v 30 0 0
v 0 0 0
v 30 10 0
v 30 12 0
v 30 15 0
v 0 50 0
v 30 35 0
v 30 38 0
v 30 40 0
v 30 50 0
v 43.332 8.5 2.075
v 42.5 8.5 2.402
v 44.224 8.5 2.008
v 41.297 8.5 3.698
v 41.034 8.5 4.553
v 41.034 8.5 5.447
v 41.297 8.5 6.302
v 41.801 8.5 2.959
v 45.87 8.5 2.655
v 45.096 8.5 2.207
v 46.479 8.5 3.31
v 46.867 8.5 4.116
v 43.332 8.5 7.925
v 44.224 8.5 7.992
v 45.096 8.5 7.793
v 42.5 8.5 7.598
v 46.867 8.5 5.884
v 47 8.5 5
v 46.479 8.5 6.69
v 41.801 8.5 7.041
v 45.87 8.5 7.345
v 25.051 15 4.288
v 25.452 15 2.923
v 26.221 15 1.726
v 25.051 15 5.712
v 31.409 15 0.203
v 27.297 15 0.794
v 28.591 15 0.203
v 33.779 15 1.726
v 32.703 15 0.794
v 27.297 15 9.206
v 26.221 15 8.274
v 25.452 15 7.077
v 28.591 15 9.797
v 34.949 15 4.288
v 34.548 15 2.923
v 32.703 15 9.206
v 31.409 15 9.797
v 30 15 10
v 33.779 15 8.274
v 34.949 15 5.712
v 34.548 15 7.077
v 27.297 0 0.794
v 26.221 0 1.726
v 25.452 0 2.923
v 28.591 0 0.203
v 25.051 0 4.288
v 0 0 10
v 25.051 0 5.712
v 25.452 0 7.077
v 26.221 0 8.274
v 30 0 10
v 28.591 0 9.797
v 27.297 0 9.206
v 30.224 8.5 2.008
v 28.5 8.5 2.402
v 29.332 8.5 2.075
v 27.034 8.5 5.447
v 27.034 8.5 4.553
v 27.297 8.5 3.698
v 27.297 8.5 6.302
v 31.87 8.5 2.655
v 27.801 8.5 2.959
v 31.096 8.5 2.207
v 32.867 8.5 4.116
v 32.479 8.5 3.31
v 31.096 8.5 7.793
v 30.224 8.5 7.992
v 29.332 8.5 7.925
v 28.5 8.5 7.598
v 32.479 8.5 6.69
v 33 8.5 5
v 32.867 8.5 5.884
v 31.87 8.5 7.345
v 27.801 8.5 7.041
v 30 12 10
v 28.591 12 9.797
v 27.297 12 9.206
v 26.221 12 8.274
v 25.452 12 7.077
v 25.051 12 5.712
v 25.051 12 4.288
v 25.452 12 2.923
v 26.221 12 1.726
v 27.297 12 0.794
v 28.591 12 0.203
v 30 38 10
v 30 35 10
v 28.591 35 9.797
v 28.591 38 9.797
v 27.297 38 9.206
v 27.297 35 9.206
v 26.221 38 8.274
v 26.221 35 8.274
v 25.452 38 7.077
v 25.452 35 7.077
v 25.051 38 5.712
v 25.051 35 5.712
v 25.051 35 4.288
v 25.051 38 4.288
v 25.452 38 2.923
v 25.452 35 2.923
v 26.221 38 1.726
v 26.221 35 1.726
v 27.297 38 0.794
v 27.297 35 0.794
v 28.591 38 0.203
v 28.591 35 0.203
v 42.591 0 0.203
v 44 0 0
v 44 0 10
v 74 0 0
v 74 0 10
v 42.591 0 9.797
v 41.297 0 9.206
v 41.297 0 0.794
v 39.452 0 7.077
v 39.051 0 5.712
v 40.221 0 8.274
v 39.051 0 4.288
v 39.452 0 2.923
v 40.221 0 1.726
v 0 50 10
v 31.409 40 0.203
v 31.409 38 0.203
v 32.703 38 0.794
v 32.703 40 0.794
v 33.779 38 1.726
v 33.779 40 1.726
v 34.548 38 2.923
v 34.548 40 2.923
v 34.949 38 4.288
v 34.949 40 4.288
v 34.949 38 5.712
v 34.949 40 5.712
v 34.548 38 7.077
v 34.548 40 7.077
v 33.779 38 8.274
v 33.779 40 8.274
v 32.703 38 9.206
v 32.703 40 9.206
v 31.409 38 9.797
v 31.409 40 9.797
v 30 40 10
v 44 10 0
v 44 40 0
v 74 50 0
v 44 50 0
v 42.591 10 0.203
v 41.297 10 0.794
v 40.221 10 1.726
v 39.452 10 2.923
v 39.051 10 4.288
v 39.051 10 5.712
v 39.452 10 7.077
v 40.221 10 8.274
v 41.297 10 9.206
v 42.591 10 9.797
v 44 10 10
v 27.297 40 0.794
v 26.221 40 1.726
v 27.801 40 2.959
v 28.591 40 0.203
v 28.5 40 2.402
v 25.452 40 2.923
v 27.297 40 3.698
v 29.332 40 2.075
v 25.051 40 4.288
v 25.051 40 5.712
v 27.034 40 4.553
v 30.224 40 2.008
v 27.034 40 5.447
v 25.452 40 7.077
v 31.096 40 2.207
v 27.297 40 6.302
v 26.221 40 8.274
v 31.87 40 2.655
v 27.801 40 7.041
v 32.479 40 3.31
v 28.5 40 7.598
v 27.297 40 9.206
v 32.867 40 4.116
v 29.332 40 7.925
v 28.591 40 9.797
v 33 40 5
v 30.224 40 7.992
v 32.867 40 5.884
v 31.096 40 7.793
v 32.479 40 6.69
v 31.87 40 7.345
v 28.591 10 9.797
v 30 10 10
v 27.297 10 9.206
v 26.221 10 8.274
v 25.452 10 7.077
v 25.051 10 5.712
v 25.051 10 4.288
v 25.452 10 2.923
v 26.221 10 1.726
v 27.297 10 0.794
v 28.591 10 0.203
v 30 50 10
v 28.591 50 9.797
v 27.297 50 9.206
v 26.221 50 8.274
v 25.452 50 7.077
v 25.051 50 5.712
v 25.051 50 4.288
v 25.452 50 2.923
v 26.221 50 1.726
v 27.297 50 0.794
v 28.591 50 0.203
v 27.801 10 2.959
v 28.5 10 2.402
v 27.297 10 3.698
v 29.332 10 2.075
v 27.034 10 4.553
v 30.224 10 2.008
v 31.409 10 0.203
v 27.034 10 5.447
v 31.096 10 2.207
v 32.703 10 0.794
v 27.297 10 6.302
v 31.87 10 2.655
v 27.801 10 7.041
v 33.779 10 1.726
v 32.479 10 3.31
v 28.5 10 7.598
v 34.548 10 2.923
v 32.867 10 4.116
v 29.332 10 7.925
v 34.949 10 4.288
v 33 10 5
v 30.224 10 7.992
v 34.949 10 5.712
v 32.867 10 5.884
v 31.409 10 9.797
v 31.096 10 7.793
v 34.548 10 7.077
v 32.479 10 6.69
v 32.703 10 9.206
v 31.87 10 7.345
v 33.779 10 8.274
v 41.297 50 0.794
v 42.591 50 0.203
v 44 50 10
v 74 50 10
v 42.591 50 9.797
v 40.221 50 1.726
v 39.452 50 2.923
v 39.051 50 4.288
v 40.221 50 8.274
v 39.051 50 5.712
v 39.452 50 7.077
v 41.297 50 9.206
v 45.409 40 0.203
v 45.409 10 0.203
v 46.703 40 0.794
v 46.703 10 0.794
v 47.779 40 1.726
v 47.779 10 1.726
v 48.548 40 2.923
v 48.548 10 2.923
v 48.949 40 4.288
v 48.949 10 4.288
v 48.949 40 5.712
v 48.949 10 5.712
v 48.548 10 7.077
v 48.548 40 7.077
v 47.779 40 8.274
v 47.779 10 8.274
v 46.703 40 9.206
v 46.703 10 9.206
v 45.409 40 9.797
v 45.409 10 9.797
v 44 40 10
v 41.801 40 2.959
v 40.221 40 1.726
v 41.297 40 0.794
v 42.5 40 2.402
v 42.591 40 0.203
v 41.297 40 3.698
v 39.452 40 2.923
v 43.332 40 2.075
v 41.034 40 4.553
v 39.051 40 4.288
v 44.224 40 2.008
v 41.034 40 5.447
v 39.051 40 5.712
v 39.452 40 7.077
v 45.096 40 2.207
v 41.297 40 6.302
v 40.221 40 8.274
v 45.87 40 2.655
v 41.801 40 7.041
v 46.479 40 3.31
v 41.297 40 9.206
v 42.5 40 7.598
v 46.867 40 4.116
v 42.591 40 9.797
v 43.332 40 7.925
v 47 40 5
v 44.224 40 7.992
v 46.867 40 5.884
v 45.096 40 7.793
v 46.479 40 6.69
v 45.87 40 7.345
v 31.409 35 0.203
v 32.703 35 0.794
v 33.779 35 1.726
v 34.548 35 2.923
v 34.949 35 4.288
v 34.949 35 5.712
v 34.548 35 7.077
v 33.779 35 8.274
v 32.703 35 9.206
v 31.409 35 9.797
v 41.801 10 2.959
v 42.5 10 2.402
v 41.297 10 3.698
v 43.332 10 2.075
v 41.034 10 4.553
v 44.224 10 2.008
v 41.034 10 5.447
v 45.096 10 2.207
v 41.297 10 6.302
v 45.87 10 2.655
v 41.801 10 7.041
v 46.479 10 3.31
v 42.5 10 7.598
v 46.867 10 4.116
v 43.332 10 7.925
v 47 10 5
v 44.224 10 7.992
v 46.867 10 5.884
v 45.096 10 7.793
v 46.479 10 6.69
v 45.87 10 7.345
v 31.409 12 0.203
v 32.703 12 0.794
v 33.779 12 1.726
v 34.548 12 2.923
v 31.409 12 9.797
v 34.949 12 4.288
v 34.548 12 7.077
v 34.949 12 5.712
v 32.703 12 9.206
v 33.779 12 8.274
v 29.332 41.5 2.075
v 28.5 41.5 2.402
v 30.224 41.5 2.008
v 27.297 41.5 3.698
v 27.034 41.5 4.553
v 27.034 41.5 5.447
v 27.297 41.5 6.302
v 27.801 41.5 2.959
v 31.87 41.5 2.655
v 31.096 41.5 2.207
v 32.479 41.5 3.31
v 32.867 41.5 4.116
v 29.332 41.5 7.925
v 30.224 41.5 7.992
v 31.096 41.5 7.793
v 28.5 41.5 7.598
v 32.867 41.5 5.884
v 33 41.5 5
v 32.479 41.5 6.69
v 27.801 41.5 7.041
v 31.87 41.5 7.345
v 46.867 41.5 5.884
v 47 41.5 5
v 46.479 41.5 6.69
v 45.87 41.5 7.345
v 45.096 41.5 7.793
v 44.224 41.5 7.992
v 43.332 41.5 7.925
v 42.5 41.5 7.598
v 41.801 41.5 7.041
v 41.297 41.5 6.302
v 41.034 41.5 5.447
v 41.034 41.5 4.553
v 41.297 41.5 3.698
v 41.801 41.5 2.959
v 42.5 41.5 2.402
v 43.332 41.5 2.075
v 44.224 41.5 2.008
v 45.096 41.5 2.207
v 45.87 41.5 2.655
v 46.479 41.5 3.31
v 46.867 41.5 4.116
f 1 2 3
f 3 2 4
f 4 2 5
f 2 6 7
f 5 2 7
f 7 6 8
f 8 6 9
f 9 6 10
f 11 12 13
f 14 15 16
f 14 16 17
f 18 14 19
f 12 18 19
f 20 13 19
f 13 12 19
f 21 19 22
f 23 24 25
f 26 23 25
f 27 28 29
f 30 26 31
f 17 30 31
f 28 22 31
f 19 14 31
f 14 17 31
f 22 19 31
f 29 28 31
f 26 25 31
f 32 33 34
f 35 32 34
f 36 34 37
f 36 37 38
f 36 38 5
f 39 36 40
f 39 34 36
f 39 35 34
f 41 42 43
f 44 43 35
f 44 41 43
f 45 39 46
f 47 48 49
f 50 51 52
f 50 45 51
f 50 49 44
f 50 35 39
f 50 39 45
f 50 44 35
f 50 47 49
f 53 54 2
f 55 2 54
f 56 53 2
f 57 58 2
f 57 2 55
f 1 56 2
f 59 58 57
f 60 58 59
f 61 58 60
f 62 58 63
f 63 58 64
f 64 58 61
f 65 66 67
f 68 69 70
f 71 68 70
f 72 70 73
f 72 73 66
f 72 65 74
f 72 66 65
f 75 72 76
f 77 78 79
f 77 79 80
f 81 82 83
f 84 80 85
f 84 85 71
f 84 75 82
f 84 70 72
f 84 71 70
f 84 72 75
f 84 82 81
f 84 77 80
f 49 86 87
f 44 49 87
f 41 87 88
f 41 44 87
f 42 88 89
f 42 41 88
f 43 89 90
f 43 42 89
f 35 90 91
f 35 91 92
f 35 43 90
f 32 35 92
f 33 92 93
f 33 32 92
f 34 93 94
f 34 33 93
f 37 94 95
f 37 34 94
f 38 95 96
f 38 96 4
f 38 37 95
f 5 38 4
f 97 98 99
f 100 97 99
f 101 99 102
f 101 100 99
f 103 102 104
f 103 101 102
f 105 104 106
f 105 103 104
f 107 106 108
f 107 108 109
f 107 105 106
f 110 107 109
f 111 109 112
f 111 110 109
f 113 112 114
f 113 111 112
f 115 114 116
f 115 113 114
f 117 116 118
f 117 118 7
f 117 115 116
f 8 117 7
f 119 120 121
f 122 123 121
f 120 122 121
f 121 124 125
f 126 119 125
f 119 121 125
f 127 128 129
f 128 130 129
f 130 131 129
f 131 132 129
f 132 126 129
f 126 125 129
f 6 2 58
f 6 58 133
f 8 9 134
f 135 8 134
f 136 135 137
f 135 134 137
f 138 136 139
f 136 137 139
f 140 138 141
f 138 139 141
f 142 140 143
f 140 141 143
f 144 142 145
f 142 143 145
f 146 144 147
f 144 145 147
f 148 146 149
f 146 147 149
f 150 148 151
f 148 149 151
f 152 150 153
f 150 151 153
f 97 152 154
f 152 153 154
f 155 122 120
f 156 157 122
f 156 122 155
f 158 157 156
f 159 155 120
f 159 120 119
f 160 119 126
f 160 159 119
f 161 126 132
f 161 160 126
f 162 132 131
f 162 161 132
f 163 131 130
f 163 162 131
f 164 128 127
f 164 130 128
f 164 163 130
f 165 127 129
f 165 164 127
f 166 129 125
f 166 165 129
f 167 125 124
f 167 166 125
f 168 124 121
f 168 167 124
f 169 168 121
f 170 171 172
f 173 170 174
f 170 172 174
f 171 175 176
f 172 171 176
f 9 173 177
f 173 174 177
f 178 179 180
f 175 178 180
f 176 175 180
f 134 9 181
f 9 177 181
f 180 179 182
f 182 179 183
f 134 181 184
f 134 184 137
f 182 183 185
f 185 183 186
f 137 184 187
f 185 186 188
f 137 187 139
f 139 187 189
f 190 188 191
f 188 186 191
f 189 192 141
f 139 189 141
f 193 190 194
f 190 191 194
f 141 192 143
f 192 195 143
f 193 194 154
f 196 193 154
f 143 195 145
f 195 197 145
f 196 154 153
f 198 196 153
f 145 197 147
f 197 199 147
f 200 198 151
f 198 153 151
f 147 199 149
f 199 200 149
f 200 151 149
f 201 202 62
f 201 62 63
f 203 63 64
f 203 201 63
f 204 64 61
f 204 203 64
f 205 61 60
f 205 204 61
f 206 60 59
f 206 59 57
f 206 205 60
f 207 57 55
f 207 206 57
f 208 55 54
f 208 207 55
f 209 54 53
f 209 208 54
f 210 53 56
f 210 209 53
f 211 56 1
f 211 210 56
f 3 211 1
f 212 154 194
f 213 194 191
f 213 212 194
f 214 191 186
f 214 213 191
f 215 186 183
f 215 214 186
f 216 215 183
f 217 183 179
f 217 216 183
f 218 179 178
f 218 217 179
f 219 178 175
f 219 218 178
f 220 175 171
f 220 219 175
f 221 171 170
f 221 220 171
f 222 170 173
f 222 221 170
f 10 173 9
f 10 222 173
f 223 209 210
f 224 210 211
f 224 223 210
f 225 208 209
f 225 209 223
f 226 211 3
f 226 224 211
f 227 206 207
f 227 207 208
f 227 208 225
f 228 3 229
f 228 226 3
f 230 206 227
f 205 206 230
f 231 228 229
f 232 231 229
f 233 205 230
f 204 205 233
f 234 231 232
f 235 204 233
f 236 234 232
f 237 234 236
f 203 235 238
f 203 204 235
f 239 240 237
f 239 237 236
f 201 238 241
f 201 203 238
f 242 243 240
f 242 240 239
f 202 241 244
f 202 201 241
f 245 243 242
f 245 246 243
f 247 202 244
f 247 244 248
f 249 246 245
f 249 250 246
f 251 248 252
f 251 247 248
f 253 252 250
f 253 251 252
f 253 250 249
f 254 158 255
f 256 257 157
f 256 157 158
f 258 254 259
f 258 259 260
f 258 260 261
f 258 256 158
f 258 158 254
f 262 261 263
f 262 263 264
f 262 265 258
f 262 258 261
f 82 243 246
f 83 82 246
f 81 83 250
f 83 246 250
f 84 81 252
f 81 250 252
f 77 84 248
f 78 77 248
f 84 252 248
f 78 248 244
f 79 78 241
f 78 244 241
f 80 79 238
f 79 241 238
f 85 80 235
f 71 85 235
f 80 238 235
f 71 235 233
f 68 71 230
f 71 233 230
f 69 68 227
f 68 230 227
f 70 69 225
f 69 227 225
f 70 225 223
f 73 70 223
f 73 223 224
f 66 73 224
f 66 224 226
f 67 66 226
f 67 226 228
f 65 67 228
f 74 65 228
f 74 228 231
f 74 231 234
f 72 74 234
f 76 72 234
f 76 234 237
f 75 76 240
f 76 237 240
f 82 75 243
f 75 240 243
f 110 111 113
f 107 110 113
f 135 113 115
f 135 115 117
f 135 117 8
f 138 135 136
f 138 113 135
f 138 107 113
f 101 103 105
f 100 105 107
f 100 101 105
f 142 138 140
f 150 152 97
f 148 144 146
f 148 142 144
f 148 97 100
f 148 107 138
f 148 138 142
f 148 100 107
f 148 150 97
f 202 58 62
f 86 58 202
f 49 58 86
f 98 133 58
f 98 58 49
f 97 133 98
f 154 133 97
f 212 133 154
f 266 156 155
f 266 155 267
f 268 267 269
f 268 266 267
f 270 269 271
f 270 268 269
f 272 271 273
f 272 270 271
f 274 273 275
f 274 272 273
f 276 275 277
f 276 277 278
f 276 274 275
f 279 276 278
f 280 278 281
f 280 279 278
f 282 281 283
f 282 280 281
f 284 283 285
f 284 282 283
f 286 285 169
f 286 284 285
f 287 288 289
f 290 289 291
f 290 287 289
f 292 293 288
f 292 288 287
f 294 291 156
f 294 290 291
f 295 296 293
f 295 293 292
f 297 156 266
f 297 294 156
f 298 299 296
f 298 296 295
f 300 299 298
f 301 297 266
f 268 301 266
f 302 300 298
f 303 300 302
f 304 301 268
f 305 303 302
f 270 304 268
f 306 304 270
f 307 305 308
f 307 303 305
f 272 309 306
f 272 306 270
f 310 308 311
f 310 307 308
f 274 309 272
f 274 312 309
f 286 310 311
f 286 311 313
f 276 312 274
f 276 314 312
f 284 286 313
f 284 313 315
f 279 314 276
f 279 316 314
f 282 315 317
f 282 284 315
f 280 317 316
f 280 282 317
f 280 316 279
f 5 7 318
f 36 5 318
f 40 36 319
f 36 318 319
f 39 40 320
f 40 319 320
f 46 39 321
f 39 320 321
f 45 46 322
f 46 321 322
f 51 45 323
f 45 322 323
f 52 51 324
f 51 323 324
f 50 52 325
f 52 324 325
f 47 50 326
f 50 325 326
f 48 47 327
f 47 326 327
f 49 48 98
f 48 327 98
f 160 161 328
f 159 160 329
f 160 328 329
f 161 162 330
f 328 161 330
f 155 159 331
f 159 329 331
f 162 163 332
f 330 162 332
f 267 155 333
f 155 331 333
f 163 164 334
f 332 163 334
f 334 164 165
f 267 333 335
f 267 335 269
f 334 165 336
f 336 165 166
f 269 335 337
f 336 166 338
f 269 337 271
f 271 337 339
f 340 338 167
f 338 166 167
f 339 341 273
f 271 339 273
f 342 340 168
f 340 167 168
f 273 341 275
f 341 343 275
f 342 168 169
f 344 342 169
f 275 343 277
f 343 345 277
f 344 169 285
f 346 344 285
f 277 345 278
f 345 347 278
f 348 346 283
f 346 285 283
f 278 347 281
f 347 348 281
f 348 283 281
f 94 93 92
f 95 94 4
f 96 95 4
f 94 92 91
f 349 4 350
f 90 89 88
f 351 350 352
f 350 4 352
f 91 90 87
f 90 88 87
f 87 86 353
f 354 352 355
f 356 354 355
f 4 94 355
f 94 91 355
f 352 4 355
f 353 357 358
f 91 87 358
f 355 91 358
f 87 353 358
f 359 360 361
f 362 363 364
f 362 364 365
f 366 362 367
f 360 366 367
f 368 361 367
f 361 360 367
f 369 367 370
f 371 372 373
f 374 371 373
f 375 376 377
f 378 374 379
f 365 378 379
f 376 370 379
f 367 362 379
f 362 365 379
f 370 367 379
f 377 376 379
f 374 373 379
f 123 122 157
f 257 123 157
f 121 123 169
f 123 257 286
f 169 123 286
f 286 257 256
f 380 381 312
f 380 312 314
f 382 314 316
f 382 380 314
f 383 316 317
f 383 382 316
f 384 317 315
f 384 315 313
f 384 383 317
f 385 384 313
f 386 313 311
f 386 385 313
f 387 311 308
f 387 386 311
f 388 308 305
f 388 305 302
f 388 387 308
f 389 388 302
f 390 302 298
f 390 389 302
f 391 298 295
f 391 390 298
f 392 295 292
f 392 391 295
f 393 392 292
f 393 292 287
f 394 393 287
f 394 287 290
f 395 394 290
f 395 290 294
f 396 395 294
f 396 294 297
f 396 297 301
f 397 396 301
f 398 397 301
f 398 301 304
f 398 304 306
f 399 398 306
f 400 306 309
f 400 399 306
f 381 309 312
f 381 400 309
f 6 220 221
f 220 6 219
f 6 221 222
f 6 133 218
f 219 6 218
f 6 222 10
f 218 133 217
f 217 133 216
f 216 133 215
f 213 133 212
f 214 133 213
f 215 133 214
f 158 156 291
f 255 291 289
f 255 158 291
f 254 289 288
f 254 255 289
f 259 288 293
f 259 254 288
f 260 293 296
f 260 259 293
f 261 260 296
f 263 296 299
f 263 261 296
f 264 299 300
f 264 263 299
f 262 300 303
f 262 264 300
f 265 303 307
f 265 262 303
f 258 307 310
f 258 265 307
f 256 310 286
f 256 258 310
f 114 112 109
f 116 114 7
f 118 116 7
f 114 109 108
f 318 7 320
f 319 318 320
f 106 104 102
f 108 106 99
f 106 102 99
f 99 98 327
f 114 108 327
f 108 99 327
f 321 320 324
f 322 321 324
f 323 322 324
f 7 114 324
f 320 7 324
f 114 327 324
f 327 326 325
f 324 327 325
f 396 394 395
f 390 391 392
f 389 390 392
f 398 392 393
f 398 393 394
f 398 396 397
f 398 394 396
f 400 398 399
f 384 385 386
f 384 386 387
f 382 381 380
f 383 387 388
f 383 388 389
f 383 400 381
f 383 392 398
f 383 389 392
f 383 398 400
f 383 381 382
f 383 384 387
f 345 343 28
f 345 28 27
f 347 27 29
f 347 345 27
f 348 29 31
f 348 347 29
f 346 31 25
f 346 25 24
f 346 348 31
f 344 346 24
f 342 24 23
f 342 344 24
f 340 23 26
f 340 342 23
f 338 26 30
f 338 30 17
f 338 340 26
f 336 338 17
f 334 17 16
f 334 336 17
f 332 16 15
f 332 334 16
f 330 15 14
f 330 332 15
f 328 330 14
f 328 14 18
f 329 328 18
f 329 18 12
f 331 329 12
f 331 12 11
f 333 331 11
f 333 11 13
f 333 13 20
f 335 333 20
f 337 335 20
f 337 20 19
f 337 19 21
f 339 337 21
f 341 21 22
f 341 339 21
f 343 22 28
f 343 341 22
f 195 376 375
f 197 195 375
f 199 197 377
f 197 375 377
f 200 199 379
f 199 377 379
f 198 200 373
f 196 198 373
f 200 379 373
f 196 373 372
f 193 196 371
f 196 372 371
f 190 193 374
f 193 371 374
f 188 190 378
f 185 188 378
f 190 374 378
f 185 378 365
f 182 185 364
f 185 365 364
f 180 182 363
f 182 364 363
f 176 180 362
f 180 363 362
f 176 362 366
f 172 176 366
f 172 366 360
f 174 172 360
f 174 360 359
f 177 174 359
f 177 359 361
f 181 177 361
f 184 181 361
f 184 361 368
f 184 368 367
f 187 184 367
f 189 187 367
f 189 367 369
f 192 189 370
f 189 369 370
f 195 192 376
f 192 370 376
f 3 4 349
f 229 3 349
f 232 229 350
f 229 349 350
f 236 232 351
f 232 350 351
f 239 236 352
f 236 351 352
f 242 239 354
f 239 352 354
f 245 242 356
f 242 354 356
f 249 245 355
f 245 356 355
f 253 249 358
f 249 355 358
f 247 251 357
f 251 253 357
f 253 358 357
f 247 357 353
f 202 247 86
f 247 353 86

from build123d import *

# Parameters (mm, degrees)
CYLINDER007_R          = 3
CYLINDER007_DEPTH      = 1.5
CYLINDER007_ROLL_ANGLE = 90
CYLINDER006_R          = 3
CYLINDER006_DEPTH      = 1.5
CYLINDER006_ROLL_ANGLE = 90
CYLINDER003_R          = 5
CYLINDER003_DEPTH      = 30
CYLINDER003_ROLL_ANGLE = 90
CYLINDER_R             = 5
CYLINDER_DEPTH         = 50
CYLINDER_ROLL_ANGLE    = 90
BOX_W                  = 30
BOX_H                  = 50
BOX_DEPTH              = 10
CYLINDER009_R          = 5
CYLINDER009_DEPTH      = 3
CYLINDER009_ROLL_ANGLE = 90
CYLINDER008_R          = 5
CYLINDER008_DEPTH      = 3
CYLINDER008_ROLL_ANGLE = 90
CYLINDER004_R          = 3
CYLINDER004_DEPTH      = 1.5
CYLINDER004_ROLL_ANGLE = 90
CYLINDER005_R          = 3
CYLINDER005_DEPTH      = 1.5
CYLINDER005_ROLL_ANGLE = 90
CYLINDER002_R          = 5
CYLINDER002_DEPTH      = 10
CYLINDER002_ROLL_ANGLE = 90
CYLINDER001_R          = 5
CYLINDER001_DEPTH      = 10
CYLINDER001_ROLL_ANGLE = 90


with BuildPart() as cylinder007:
    # Cylinder007 → Cylinder007 (new body)
    with BuildSketch(Plane.XY):
        Circle(CYLINDER007_R)
    extrude(amount=CYLINDER007_DEPTH)


with BuildPart() as cylinder007_1:
    # Cylinder007 roll: moved
    add(cylinder007.part.rotate(Axis((0, 0, 0), (1, 0, 0)), CYLINDER007_ROLL_ANGLE))


with BuildPart() as cylinder007_2:
    # Cylinder007 placement: moved
    add(cylinder007_1.part.moved(Location((44, 41.5, 5))))


with BuildPart() as cylinder006:
    # Cylinder006 → Cylinder006 (new body)
    with BuildSketch(Plane.XY):
        Circle(CYLINDER006_R)
    extrude(amount=CYLINDER006_DEPTH)


with BuildPart() as cylinder006_1:
    # Cylinder006 roll: moved
    add(cylinder006.part.rotate(Axis((0, 0, 0), (1, 0, 0)), CYLINDER006_ROLL_ANGLE))


with BuildPart() as cylinder006_2:
    # Cylinder006 placement: moved
    add(cylinder006_1.part.moved(Location((44, 10, 5))))


with BuildPart() as cylinder003:
    # Cylinder003 → Cylinder003 (new body)
    with BuildSketch(Plane.XY):
        Circle(CYLINDER003_R)
    extrude(amount=CYLINDER003_DEPTH)


with BuildPart() as cylinder003_1:
    # Cylinder003 roll: moved
    add(cylinder003.part.rotate(Axis((0, 0, 0), (1, 0, 0)), CYLINDER003_ROLL_ANGLE))


with BuildPart() as cylinder003_2:
    # Cylinder003 placement: moved
    add(cylinder003_1.part.moved(Location((44, 40, 5))))


with BuildPart() as cylinder:
    # Cylinder → Cylinder (new body)
    with BuildSketch(Plane.XY):
        Circle(CYLINDER_R)
    extrude(amount=CYLINDER_DEPTH)


with BuildPart() as cylinder_1:
    # Cylinder roll: moved
    add(cylinder.part.rotate(Axis((0, 0, 0), (1, 0, 0)), CYLINDER_ROLL_ANGLE))


with BuildPart() as cylinder_2:
    # Cylinder placement: moved
    add(cylinder_1.part.moved(Location((30, 50, 5))))


with BuildPart() as fusion:
    # Box → Box (new body)
    with BuildSketch(Plane.XY):
        with Locations((15, 25)):
            Rectangle(BOX_W, BOX_H)
    extrude(amount=BOX_DEPTH)

    # Fusion: union Cylinder
    add(cylinder_2.part)


with BuildPart() as cut004:
    # Part__Mirroring: instance of Fusion
    add(fusion.part.mirror(Plane(origin=(0, 0, 0), x_dir=(0, -1, 0), z_dir=(1, 0, 0))))


with BuildPart() as cut004_1:
    # Part__Mirroring placement: moved
    add(cut004.part.moved(Location((74, 0, 0))))

    # Cut002: cut Cylinder003
    add(cylinder003_2.part, mode=Mode.SUBTRACT)

    # Cut003: cut Cylinder006
    add(cylinder006_2.part, mode=Mode.SUBTRACT)

    # Cut004: cut Cylinder007
    add(cylinder007_2.part, mode=Mode.SUBTRACT)


with BuildPart() as cylinder009:
    # Cylinder009 → Cylinder009 (new body)
    with BuildSketch(Plane.XY):
        Circle(CYLINDER009_R)
    extrude(amount=CYLINDER009_DEPTH)


with BuildPart() as cylinder009_1:
    # Cylinder009 roll: moved
    add(cylinder009.part.rotate(Axis((0, 0, 0), (1, 0, 0)), CYLINDER009_ROLL_ANGLE))


with BuildPart() as cylinder009_2:
    # Cylinder009 placement: moved
    add(cylinder009_1.part.moved(Location((30, 38, 5))))


with BuildPart() as cylinder008:
    # Cylinder008 → Cylinder008 (new body)
    with BuildSketch(Plane.XY):
        Circle(CYLINDER008_R)
    extrude(amount=CYLINDER008_DEPTH)


with BuildPart() as cylinder008_1:
    # Cylinder008 roll: moved
    add(cylinder008.part.rotate(Axis((0, 0, 0), (1, 0, 0)), CYLINDER008_ROLL_ANGLE))


with BuildPart() as cylinder008_2:
    # Cylinder008 placement: moved
    add(cylinder008_1.part.moved(Location((30, 15, 5))))


with BuildPart() as cylinder004:
    # Cylinder004 → Cylinder004 (new body)
    with BuildSketch(Plane.XY):
        Circle(CYLINDER004_R)
    extrude(amount=CYLINDER004_DEPTH)


with BuildPart() as cylinder004_1:
    # Cylinder004 roll: moved
    add(cylinder004.part.rotate(Axis((0, 0, 0), (1, 0, 0)), CYLINDER004_ROLL_ANGLE))


with BuildPart() as cylinder004_2:
    # Cylinder004 placement: moved
    add(cylinder004_1.part.moved(Location((30, 10, 5))))


with BuildPart() as cylinder005:
    # Cylinder005 → Cylinder005 (new body)
    with BuildSketch(Plane.XY):
        Circle(CYLINDER005_R)
    extrude(amount=CYLINDER005_DEPTH)


with BuildPart() as cylinder005_1:
    # Cylinder005 roll: moved
    add(cylinder005.part.rotate(Axis((0, 0, 0), (1, 0, 0)), CYLINDER005_ROLL_ANGLE))


with BuildPart() as cylinder005_2:
    # Cylinder005 placement: moved
    add(cylinder005_1.part.moved(Location((30, 41.5, 5))))


with BuildPart() as cylinder002:
    # Cylinder002 → Cylinder002 (new body)
    with BuildSketch(Plane.XY):
        Circle(CYLINDER002_R)
    extrude(amount=CYLINDER002_DEPTH)


with BuildPart() as cylinder002_1:
    # Cylinder002 roll: moved
    add(cylinder002.part.rotate(Axis((0, 0, 0), (1, 0, 0)), CYLINDER002_ROLL_ANGLE))


with BuildPart() as cylinder002_2:
    # Cylinder002 placement: moved
    add(cylinder002_1.part.moved(Location((30, 50, 5))))


with BuildPart() as cylinder001:
    # Cylinder001 → Cylinder001 (new body)
    with BuildSketch(Plane.XY):
        Circle(CYLINDER001_R)
    extrude(amount=CYLINDER001_DEPTH)


with BuildPart() as cylinder001_1:
    # Cylinder001 roll: moved
    add(cylinder001.part.rotate(Axis((0, 0, 0), (1, 0, 0)), CYLINDER001_ROLL_ANGLE))


with BuildPart() as cylinder001_2:
    # Cylinder001 placement: moved
    add(cylinder001_1.part.moved(Location((30, 10, 5))))


with BuildPart() as cut006:
    # Cut base: copy of Fusion
    add(fusion.part)

    # Cut: cut Cylinder001
    add(cylinder001_2.part, mode=Mode.SUBTRACT)

    # Cut001: cut Cylinder002
    add(cylinder002_2.part, mode=Mode.SUBTRACT)

    # Fusion001: union Cylinder005
    add(cylinder005_2.part)

    # Fusion002: union Cylinder004
    add(cylinder004_2.part)

    # Cut005: cut Cylinder008
    add(cylinder008_2.part, mode=Mode.SUBTRACT)

    # Cut006: cut Cylinder009
    add(cylinder009_2.part, mode=Mode.SUBTRACT)


solid = Compound([cut004_1.part, cut006.part])
